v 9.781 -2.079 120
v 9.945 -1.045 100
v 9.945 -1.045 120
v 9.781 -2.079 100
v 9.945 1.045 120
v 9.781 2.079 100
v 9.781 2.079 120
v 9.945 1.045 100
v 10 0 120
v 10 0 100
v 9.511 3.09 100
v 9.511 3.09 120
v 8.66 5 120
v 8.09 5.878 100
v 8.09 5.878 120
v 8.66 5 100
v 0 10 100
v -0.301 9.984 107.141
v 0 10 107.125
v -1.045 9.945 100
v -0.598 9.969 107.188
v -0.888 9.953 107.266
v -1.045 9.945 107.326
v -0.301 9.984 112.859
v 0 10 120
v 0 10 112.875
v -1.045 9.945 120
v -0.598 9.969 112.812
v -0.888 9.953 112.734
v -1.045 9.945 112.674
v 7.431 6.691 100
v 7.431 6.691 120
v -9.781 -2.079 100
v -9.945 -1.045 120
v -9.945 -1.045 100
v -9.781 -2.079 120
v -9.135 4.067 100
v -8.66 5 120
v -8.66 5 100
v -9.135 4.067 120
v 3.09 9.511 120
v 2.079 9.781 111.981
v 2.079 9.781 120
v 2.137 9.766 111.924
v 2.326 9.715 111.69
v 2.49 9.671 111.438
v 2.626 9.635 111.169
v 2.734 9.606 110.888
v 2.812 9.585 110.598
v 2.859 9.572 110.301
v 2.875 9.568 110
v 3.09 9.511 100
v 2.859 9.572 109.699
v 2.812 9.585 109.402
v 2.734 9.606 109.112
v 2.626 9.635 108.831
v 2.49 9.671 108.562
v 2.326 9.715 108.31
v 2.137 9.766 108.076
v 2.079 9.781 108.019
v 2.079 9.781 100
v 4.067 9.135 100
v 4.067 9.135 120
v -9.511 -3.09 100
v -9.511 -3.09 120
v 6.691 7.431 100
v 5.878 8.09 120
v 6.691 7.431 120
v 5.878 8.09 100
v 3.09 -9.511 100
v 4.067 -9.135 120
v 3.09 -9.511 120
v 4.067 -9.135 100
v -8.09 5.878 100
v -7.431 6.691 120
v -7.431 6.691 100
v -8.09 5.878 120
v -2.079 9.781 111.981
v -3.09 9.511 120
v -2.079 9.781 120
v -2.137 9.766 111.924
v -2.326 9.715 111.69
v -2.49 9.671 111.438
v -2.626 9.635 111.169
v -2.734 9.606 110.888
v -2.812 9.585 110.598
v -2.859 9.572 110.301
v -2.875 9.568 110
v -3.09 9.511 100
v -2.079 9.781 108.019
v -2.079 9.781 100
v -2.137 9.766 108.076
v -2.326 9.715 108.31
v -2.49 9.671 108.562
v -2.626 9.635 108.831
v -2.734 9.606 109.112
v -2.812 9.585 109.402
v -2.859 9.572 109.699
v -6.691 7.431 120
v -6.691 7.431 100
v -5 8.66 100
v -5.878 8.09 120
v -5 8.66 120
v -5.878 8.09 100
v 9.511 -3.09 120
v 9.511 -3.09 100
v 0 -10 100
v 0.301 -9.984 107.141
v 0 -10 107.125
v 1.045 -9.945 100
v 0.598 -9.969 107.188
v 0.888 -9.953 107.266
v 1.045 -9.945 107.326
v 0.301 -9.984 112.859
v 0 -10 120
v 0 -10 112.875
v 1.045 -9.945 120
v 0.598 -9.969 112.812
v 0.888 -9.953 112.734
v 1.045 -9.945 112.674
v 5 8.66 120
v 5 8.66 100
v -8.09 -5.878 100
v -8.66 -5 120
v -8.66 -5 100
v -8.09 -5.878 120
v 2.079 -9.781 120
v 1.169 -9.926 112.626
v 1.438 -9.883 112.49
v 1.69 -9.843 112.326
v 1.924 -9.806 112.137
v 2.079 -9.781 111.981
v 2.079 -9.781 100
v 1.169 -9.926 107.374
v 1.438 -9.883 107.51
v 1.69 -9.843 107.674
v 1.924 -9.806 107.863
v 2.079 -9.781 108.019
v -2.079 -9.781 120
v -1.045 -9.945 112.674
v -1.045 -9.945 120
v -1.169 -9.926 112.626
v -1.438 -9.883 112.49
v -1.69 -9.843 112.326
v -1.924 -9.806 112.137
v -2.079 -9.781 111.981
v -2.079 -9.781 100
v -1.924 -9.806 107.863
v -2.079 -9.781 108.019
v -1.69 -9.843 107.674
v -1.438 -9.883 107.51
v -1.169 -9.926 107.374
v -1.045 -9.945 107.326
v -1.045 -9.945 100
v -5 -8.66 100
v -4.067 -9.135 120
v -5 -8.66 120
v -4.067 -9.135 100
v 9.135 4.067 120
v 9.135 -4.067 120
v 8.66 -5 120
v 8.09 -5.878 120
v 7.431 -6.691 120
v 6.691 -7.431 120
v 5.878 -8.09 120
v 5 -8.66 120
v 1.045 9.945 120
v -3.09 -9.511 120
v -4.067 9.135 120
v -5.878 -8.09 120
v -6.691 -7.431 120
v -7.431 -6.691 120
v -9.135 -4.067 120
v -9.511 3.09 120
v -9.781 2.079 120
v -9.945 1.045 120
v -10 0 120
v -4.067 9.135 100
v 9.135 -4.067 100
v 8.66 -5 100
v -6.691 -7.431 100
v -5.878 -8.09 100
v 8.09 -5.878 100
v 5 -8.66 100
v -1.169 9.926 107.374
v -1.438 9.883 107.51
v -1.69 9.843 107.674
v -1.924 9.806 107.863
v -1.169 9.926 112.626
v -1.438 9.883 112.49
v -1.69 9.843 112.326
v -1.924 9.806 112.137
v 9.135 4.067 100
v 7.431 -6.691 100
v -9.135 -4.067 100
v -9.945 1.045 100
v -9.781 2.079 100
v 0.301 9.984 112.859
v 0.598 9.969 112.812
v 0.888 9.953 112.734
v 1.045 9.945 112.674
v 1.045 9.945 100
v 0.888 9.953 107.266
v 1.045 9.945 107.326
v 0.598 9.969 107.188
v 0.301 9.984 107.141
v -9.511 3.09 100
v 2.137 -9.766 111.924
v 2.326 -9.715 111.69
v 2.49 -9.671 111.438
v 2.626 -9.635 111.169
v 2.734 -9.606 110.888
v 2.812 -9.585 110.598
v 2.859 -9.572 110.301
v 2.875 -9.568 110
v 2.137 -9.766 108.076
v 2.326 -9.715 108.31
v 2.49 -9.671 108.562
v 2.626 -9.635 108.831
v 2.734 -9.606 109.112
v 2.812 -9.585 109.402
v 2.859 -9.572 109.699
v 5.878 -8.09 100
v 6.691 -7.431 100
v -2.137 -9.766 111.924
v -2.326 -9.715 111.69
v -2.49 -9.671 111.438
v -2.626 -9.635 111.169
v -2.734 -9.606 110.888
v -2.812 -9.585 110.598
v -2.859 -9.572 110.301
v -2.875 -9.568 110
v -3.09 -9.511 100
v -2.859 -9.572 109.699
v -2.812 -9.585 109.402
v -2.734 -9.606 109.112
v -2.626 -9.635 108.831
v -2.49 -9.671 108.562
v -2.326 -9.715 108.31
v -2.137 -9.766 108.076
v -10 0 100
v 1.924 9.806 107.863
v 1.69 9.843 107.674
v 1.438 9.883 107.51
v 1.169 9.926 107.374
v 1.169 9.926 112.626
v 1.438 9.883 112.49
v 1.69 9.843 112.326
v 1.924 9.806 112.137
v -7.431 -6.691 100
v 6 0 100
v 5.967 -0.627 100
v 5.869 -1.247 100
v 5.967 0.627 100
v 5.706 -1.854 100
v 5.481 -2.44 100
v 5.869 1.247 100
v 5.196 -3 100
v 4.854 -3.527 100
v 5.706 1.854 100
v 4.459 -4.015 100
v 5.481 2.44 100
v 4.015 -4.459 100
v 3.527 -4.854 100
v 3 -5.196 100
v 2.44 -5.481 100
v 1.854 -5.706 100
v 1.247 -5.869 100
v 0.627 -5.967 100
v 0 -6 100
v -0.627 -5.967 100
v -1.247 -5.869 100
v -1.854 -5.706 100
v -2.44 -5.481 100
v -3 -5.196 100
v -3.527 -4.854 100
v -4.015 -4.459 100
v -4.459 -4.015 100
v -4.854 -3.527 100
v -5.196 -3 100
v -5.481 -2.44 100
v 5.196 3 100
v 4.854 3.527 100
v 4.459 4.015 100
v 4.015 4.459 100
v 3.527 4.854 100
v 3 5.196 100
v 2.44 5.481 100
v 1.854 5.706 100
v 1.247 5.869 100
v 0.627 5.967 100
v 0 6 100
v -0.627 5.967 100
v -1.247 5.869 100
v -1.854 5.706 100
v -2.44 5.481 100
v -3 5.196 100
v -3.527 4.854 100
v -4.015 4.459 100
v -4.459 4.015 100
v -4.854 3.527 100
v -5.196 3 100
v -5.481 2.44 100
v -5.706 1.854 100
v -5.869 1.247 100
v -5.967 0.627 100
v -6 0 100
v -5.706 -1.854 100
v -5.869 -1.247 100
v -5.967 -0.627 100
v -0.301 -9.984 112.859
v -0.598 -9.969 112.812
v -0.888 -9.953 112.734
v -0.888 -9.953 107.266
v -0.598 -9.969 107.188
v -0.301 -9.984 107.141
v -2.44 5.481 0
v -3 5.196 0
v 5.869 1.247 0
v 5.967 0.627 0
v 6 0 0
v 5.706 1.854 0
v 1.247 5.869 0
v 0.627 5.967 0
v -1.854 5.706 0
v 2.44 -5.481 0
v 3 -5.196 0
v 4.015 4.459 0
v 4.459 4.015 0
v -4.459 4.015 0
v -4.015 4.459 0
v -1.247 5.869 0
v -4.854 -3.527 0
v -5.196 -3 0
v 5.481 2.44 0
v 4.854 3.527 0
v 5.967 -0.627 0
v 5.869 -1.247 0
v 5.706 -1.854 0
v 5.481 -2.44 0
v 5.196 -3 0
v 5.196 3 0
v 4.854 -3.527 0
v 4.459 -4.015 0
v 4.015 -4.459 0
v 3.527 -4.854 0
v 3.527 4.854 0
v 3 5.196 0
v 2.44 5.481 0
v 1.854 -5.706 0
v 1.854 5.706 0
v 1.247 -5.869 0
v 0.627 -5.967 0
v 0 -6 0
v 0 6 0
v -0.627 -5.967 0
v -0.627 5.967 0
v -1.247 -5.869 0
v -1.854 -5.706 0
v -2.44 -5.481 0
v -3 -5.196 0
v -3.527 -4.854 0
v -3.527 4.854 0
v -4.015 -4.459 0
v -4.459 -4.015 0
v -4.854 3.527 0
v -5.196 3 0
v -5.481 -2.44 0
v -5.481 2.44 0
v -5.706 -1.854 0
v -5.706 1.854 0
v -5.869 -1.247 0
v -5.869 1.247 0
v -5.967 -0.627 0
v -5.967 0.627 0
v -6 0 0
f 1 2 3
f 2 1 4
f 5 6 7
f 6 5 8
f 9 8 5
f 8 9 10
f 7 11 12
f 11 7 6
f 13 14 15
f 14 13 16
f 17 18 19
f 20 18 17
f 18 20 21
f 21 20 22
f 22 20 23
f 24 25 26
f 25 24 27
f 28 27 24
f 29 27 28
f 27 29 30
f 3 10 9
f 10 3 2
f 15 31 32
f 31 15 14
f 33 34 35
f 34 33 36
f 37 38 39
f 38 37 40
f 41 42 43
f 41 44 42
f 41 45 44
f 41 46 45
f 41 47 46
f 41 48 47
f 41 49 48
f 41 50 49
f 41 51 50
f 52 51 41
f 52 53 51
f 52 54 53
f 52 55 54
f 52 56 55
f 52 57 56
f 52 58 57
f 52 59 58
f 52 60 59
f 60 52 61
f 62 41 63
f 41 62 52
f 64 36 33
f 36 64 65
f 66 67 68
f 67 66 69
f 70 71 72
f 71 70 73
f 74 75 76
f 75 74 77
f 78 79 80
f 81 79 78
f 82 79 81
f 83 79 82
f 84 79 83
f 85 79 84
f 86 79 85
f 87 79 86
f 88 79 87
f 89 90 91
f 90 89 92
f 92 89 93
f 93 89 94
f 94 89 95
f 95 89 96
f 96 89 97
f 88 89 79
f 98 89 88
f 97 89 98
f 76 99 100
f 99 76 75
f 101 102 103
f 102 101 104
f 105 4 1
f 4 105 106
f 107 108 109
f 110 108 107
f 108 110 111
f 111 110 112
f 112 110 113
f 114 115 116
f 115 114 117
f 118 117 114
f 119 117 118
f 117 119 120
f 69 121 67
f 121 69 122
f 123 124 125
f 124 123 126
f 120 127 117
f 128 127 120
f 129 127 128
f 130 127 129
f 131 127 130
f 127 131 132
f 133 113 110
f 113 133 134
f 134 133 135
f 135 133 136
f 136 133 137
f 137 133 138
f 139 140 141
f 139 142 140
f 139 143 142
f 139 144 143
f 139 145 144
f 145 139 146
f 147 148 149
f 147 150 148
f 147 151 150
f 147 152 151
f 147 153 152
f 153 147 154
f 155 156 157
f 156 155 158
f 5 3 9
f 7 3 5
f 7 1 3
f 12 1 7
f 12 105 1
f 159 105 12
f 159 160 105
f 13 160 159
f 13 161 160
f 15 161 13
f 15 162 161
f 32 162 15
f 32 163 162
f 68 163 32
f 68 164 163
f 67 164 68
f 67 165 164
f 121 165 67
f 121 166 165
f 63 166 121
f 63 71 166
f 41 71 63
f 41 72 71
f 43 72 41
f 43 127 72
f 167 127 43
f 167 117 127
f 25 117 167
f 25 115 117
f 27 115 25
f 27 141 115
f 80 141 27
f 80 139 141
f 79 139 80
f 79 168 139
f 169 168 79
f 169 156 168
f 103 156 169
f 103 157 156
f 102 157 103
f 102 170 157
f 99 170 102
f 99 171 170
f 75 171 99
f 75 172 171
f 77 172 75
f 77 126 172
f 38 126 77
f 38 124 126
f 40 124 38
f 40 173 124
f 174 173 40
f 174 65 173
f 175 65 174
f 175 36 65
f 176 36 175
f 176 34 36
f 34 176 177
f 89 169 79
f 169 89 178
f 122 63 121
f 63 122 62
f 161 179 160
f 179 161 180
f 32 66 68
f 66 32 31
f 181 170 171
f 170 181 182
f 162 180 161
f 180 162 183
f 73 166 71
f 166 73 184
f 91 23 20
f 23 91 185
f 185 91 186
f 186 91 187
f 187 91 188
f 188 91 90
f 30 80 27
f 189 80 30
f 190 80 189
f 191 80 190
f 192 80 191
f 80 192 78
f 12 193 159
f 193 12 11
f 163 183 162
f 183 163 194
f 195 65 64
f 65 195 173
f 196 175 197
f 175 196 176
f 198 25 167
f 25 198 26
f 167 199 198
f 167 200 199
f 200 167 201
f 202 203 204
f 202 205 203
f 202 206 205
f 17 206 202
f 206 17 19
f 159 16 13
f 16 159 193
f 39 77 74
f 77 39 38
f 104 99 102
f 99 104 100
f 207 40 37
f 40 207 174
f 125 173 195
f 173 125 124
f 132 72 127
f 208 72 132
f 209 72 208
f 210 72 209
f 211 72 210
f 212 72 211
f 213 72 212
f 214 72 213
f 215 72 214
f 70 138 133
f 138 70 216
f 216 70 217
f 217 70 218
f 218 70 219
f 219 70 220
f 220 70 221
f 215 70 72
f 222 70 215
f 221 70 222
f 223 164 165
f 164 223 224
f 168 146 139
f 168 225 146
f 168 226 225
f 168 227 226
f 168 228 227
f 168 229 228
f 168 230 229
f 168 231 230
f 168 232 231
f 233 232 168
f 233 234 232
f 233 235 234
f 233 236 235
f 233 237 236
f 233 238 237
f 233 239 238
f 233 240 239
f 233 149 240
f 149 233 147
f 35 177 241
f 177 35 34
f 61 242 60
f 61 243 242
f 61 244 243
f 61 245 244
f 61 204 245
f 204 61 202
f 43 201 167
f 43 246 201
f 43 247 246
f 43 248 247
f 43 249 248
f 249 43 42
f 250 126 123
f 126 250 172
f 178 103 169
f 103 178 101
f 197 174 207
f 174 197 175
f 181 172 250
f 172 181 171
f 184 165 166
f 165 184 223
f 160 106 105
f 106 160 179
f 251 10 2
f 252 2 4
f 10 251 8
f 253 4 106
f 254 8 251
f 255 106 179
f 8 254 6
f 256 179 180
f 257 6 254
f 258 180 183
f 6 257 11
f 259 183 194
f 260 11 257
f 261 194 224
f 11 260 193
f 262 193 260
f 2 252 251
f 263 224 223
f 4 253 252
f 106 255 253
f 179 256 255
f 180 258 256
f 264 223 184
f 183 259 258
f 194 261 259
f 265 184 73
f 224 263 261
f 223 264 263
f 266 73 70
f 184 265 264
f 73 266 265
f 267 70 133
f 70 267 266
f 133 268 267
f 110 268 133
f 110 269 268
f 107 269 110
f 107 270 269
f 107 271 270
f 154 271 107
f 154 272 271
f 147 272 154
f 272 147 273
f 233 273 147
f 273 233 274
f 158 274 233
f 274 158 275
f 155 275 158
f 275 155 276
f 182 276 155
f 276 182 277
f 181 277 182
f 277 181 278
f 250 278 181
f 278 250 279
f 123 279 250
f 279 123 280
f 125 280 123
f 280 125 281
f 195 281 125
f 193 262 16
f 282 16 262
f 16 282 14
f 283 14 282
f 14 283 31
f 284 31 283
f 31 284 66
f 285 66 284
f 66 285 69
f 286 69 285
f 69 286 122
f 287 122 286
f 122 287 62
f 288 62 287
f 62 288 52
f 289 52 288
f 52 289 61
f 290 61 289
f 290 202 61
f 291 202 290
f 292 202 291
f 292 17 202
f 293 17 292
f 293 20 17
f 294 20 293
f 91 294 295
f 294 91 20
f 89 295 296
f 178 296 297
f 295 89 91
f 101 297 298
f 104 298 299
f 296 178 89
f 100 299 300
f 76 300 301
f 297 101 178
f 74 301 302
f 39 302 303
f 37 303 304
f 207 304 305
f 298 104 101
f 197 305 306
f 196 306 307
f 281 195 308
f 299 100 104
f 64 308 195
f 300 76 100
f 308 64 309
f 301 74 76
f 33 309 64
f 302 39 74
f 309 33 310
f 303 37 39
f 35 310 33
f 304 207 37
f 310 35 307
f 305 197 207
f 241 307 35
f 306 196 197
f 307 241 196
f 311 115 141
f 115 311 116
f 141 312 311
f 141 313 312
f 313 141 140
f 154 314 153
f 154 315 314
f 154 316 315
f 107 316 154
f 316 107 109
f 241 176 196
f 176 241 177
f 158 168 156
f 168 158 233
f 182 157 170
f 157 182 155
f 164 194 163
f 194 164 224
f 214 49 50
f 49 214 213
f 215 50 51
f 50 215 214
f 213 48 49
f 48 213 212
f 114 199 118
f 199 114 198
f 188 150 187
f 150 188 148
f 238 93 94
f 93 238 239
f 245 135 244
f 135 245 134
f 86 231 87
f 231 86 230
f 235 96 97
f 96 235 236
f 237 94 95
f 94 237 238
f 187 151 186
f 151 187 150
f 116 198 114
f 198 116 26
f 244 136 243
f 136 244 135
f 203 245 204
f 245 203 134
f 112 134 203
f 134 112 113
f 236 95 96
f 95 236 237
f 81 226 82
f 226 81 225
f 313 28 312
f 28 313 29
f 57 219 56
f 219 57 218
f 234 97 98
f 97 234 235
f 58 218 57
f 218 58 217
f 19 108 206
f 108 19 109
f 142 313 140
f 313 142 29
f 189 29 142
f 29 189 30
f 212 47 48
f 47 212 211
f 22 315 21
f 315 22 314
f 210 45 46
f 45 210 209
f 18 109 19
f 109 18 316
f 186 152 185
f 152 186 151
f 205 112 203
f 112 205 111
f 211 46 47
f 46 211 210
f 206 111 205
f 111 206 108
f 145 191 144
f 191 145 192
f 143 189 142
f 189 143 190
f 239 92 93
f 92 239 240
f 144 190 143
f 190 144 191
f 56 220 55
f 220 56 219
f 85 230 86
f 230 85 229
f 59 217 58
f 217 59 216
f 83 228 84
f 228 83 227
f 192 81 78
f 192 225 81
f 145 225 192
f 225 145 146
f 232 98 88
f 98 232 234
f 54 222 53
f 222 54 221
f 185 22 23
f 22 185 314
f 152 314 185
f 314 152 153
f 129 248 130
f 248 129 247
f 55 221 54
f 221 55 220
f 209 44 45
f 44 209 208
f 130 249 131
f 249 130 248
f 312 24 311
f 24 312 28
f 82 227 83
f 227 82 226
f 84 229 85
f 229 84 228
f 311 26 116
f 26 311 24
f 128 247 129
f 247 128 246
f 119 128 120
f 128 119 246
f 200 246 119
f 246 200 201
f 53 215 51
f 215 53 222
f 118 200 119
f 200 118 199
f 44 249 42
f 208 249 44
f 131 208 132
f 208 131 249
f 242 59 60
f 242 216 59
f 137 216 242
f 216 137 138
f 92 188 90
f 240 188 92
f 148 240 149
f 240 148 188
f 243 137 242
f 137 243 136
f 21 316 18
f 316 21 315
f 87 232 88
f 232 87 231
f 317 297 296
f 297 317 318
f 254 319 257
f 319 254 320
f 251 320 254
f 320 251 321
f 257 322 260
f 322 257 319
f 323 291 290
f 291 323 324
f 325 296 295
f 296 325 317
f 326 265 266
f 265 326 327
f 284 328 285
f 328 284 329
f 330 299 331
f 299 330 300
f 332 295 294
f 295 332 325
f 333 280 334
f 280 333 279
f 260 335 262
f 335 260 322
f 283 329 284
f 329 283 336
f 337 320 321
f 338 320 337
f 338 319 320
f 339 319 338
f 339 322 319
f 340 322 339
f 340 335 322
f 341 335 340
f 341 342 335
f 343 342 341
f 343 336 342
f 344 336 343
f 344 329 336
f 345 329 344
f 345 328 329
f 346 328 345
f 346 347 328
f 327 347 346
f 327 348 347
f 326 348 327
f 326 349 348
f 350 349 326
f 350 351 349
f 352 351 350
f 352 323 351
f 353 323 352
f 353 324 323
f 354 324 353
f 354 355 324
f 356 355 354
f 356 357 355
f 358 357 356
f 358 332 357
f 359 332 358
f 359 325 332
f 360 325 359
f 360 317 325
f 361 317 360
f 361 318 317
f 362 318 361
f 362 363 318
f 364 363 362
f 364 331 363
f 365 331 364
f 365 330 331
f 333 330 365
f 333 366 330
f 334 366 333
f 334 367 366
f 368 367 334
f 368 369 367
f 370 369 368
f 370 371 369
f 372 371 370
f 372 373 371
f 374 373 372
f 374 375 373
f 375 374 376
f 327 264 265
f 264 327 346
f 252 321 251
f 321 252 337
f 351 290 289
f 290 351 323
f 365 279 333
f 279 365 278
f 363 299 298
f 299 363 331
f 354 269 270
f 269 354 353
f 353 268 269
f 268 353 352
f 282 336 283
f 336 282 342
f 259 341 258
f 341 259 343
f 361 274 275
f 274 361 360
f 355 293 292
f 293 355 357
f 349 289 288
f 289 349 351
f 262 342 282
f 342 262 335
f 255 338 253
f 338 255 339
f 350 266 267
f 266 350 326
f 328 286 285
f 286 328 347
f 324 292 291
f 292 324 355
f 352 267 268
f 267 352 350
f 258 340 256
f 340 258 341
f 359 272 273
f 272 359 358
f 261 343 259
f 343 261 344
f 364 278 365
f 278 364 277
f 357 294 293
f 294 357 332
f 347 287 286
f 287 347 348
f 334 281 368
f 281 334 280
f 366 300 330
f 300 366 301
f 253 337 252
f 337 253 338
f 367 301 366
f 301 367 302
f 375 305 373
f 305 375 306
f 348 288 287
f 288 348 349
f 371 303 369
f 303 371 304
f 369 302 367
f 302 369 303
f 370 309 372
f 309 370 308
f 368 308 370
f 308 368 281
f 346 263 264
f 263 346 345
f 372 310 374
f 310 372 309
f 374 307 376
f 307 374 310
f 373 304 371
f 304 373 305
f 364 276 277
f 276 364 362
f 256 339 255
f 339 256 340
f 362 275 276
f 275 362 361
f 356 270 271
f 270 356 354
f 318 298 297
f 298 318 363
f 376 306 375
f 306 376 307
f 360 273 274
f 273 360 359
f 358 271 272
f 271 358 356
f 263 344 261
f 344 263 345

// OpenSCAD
shaft_diameter = 12;
vane_head_diameter = 20;

module head(){
    difference(){
            {cylinder(20, d=vane_head_diameter, $fn=60);}
            translate([0, 0, 10]) rotate([90, 0, 0]) translate([0, 0, -50]) {cylinder(100, d=5*1.15, $fn=60);}
     }
    }
module vane(){
    union(){
        {cylinder(100, d=shaft_diameter, $fn=60);}
        translate([0, 0, 100]) {head();}
        }
    }
    
 vane();
